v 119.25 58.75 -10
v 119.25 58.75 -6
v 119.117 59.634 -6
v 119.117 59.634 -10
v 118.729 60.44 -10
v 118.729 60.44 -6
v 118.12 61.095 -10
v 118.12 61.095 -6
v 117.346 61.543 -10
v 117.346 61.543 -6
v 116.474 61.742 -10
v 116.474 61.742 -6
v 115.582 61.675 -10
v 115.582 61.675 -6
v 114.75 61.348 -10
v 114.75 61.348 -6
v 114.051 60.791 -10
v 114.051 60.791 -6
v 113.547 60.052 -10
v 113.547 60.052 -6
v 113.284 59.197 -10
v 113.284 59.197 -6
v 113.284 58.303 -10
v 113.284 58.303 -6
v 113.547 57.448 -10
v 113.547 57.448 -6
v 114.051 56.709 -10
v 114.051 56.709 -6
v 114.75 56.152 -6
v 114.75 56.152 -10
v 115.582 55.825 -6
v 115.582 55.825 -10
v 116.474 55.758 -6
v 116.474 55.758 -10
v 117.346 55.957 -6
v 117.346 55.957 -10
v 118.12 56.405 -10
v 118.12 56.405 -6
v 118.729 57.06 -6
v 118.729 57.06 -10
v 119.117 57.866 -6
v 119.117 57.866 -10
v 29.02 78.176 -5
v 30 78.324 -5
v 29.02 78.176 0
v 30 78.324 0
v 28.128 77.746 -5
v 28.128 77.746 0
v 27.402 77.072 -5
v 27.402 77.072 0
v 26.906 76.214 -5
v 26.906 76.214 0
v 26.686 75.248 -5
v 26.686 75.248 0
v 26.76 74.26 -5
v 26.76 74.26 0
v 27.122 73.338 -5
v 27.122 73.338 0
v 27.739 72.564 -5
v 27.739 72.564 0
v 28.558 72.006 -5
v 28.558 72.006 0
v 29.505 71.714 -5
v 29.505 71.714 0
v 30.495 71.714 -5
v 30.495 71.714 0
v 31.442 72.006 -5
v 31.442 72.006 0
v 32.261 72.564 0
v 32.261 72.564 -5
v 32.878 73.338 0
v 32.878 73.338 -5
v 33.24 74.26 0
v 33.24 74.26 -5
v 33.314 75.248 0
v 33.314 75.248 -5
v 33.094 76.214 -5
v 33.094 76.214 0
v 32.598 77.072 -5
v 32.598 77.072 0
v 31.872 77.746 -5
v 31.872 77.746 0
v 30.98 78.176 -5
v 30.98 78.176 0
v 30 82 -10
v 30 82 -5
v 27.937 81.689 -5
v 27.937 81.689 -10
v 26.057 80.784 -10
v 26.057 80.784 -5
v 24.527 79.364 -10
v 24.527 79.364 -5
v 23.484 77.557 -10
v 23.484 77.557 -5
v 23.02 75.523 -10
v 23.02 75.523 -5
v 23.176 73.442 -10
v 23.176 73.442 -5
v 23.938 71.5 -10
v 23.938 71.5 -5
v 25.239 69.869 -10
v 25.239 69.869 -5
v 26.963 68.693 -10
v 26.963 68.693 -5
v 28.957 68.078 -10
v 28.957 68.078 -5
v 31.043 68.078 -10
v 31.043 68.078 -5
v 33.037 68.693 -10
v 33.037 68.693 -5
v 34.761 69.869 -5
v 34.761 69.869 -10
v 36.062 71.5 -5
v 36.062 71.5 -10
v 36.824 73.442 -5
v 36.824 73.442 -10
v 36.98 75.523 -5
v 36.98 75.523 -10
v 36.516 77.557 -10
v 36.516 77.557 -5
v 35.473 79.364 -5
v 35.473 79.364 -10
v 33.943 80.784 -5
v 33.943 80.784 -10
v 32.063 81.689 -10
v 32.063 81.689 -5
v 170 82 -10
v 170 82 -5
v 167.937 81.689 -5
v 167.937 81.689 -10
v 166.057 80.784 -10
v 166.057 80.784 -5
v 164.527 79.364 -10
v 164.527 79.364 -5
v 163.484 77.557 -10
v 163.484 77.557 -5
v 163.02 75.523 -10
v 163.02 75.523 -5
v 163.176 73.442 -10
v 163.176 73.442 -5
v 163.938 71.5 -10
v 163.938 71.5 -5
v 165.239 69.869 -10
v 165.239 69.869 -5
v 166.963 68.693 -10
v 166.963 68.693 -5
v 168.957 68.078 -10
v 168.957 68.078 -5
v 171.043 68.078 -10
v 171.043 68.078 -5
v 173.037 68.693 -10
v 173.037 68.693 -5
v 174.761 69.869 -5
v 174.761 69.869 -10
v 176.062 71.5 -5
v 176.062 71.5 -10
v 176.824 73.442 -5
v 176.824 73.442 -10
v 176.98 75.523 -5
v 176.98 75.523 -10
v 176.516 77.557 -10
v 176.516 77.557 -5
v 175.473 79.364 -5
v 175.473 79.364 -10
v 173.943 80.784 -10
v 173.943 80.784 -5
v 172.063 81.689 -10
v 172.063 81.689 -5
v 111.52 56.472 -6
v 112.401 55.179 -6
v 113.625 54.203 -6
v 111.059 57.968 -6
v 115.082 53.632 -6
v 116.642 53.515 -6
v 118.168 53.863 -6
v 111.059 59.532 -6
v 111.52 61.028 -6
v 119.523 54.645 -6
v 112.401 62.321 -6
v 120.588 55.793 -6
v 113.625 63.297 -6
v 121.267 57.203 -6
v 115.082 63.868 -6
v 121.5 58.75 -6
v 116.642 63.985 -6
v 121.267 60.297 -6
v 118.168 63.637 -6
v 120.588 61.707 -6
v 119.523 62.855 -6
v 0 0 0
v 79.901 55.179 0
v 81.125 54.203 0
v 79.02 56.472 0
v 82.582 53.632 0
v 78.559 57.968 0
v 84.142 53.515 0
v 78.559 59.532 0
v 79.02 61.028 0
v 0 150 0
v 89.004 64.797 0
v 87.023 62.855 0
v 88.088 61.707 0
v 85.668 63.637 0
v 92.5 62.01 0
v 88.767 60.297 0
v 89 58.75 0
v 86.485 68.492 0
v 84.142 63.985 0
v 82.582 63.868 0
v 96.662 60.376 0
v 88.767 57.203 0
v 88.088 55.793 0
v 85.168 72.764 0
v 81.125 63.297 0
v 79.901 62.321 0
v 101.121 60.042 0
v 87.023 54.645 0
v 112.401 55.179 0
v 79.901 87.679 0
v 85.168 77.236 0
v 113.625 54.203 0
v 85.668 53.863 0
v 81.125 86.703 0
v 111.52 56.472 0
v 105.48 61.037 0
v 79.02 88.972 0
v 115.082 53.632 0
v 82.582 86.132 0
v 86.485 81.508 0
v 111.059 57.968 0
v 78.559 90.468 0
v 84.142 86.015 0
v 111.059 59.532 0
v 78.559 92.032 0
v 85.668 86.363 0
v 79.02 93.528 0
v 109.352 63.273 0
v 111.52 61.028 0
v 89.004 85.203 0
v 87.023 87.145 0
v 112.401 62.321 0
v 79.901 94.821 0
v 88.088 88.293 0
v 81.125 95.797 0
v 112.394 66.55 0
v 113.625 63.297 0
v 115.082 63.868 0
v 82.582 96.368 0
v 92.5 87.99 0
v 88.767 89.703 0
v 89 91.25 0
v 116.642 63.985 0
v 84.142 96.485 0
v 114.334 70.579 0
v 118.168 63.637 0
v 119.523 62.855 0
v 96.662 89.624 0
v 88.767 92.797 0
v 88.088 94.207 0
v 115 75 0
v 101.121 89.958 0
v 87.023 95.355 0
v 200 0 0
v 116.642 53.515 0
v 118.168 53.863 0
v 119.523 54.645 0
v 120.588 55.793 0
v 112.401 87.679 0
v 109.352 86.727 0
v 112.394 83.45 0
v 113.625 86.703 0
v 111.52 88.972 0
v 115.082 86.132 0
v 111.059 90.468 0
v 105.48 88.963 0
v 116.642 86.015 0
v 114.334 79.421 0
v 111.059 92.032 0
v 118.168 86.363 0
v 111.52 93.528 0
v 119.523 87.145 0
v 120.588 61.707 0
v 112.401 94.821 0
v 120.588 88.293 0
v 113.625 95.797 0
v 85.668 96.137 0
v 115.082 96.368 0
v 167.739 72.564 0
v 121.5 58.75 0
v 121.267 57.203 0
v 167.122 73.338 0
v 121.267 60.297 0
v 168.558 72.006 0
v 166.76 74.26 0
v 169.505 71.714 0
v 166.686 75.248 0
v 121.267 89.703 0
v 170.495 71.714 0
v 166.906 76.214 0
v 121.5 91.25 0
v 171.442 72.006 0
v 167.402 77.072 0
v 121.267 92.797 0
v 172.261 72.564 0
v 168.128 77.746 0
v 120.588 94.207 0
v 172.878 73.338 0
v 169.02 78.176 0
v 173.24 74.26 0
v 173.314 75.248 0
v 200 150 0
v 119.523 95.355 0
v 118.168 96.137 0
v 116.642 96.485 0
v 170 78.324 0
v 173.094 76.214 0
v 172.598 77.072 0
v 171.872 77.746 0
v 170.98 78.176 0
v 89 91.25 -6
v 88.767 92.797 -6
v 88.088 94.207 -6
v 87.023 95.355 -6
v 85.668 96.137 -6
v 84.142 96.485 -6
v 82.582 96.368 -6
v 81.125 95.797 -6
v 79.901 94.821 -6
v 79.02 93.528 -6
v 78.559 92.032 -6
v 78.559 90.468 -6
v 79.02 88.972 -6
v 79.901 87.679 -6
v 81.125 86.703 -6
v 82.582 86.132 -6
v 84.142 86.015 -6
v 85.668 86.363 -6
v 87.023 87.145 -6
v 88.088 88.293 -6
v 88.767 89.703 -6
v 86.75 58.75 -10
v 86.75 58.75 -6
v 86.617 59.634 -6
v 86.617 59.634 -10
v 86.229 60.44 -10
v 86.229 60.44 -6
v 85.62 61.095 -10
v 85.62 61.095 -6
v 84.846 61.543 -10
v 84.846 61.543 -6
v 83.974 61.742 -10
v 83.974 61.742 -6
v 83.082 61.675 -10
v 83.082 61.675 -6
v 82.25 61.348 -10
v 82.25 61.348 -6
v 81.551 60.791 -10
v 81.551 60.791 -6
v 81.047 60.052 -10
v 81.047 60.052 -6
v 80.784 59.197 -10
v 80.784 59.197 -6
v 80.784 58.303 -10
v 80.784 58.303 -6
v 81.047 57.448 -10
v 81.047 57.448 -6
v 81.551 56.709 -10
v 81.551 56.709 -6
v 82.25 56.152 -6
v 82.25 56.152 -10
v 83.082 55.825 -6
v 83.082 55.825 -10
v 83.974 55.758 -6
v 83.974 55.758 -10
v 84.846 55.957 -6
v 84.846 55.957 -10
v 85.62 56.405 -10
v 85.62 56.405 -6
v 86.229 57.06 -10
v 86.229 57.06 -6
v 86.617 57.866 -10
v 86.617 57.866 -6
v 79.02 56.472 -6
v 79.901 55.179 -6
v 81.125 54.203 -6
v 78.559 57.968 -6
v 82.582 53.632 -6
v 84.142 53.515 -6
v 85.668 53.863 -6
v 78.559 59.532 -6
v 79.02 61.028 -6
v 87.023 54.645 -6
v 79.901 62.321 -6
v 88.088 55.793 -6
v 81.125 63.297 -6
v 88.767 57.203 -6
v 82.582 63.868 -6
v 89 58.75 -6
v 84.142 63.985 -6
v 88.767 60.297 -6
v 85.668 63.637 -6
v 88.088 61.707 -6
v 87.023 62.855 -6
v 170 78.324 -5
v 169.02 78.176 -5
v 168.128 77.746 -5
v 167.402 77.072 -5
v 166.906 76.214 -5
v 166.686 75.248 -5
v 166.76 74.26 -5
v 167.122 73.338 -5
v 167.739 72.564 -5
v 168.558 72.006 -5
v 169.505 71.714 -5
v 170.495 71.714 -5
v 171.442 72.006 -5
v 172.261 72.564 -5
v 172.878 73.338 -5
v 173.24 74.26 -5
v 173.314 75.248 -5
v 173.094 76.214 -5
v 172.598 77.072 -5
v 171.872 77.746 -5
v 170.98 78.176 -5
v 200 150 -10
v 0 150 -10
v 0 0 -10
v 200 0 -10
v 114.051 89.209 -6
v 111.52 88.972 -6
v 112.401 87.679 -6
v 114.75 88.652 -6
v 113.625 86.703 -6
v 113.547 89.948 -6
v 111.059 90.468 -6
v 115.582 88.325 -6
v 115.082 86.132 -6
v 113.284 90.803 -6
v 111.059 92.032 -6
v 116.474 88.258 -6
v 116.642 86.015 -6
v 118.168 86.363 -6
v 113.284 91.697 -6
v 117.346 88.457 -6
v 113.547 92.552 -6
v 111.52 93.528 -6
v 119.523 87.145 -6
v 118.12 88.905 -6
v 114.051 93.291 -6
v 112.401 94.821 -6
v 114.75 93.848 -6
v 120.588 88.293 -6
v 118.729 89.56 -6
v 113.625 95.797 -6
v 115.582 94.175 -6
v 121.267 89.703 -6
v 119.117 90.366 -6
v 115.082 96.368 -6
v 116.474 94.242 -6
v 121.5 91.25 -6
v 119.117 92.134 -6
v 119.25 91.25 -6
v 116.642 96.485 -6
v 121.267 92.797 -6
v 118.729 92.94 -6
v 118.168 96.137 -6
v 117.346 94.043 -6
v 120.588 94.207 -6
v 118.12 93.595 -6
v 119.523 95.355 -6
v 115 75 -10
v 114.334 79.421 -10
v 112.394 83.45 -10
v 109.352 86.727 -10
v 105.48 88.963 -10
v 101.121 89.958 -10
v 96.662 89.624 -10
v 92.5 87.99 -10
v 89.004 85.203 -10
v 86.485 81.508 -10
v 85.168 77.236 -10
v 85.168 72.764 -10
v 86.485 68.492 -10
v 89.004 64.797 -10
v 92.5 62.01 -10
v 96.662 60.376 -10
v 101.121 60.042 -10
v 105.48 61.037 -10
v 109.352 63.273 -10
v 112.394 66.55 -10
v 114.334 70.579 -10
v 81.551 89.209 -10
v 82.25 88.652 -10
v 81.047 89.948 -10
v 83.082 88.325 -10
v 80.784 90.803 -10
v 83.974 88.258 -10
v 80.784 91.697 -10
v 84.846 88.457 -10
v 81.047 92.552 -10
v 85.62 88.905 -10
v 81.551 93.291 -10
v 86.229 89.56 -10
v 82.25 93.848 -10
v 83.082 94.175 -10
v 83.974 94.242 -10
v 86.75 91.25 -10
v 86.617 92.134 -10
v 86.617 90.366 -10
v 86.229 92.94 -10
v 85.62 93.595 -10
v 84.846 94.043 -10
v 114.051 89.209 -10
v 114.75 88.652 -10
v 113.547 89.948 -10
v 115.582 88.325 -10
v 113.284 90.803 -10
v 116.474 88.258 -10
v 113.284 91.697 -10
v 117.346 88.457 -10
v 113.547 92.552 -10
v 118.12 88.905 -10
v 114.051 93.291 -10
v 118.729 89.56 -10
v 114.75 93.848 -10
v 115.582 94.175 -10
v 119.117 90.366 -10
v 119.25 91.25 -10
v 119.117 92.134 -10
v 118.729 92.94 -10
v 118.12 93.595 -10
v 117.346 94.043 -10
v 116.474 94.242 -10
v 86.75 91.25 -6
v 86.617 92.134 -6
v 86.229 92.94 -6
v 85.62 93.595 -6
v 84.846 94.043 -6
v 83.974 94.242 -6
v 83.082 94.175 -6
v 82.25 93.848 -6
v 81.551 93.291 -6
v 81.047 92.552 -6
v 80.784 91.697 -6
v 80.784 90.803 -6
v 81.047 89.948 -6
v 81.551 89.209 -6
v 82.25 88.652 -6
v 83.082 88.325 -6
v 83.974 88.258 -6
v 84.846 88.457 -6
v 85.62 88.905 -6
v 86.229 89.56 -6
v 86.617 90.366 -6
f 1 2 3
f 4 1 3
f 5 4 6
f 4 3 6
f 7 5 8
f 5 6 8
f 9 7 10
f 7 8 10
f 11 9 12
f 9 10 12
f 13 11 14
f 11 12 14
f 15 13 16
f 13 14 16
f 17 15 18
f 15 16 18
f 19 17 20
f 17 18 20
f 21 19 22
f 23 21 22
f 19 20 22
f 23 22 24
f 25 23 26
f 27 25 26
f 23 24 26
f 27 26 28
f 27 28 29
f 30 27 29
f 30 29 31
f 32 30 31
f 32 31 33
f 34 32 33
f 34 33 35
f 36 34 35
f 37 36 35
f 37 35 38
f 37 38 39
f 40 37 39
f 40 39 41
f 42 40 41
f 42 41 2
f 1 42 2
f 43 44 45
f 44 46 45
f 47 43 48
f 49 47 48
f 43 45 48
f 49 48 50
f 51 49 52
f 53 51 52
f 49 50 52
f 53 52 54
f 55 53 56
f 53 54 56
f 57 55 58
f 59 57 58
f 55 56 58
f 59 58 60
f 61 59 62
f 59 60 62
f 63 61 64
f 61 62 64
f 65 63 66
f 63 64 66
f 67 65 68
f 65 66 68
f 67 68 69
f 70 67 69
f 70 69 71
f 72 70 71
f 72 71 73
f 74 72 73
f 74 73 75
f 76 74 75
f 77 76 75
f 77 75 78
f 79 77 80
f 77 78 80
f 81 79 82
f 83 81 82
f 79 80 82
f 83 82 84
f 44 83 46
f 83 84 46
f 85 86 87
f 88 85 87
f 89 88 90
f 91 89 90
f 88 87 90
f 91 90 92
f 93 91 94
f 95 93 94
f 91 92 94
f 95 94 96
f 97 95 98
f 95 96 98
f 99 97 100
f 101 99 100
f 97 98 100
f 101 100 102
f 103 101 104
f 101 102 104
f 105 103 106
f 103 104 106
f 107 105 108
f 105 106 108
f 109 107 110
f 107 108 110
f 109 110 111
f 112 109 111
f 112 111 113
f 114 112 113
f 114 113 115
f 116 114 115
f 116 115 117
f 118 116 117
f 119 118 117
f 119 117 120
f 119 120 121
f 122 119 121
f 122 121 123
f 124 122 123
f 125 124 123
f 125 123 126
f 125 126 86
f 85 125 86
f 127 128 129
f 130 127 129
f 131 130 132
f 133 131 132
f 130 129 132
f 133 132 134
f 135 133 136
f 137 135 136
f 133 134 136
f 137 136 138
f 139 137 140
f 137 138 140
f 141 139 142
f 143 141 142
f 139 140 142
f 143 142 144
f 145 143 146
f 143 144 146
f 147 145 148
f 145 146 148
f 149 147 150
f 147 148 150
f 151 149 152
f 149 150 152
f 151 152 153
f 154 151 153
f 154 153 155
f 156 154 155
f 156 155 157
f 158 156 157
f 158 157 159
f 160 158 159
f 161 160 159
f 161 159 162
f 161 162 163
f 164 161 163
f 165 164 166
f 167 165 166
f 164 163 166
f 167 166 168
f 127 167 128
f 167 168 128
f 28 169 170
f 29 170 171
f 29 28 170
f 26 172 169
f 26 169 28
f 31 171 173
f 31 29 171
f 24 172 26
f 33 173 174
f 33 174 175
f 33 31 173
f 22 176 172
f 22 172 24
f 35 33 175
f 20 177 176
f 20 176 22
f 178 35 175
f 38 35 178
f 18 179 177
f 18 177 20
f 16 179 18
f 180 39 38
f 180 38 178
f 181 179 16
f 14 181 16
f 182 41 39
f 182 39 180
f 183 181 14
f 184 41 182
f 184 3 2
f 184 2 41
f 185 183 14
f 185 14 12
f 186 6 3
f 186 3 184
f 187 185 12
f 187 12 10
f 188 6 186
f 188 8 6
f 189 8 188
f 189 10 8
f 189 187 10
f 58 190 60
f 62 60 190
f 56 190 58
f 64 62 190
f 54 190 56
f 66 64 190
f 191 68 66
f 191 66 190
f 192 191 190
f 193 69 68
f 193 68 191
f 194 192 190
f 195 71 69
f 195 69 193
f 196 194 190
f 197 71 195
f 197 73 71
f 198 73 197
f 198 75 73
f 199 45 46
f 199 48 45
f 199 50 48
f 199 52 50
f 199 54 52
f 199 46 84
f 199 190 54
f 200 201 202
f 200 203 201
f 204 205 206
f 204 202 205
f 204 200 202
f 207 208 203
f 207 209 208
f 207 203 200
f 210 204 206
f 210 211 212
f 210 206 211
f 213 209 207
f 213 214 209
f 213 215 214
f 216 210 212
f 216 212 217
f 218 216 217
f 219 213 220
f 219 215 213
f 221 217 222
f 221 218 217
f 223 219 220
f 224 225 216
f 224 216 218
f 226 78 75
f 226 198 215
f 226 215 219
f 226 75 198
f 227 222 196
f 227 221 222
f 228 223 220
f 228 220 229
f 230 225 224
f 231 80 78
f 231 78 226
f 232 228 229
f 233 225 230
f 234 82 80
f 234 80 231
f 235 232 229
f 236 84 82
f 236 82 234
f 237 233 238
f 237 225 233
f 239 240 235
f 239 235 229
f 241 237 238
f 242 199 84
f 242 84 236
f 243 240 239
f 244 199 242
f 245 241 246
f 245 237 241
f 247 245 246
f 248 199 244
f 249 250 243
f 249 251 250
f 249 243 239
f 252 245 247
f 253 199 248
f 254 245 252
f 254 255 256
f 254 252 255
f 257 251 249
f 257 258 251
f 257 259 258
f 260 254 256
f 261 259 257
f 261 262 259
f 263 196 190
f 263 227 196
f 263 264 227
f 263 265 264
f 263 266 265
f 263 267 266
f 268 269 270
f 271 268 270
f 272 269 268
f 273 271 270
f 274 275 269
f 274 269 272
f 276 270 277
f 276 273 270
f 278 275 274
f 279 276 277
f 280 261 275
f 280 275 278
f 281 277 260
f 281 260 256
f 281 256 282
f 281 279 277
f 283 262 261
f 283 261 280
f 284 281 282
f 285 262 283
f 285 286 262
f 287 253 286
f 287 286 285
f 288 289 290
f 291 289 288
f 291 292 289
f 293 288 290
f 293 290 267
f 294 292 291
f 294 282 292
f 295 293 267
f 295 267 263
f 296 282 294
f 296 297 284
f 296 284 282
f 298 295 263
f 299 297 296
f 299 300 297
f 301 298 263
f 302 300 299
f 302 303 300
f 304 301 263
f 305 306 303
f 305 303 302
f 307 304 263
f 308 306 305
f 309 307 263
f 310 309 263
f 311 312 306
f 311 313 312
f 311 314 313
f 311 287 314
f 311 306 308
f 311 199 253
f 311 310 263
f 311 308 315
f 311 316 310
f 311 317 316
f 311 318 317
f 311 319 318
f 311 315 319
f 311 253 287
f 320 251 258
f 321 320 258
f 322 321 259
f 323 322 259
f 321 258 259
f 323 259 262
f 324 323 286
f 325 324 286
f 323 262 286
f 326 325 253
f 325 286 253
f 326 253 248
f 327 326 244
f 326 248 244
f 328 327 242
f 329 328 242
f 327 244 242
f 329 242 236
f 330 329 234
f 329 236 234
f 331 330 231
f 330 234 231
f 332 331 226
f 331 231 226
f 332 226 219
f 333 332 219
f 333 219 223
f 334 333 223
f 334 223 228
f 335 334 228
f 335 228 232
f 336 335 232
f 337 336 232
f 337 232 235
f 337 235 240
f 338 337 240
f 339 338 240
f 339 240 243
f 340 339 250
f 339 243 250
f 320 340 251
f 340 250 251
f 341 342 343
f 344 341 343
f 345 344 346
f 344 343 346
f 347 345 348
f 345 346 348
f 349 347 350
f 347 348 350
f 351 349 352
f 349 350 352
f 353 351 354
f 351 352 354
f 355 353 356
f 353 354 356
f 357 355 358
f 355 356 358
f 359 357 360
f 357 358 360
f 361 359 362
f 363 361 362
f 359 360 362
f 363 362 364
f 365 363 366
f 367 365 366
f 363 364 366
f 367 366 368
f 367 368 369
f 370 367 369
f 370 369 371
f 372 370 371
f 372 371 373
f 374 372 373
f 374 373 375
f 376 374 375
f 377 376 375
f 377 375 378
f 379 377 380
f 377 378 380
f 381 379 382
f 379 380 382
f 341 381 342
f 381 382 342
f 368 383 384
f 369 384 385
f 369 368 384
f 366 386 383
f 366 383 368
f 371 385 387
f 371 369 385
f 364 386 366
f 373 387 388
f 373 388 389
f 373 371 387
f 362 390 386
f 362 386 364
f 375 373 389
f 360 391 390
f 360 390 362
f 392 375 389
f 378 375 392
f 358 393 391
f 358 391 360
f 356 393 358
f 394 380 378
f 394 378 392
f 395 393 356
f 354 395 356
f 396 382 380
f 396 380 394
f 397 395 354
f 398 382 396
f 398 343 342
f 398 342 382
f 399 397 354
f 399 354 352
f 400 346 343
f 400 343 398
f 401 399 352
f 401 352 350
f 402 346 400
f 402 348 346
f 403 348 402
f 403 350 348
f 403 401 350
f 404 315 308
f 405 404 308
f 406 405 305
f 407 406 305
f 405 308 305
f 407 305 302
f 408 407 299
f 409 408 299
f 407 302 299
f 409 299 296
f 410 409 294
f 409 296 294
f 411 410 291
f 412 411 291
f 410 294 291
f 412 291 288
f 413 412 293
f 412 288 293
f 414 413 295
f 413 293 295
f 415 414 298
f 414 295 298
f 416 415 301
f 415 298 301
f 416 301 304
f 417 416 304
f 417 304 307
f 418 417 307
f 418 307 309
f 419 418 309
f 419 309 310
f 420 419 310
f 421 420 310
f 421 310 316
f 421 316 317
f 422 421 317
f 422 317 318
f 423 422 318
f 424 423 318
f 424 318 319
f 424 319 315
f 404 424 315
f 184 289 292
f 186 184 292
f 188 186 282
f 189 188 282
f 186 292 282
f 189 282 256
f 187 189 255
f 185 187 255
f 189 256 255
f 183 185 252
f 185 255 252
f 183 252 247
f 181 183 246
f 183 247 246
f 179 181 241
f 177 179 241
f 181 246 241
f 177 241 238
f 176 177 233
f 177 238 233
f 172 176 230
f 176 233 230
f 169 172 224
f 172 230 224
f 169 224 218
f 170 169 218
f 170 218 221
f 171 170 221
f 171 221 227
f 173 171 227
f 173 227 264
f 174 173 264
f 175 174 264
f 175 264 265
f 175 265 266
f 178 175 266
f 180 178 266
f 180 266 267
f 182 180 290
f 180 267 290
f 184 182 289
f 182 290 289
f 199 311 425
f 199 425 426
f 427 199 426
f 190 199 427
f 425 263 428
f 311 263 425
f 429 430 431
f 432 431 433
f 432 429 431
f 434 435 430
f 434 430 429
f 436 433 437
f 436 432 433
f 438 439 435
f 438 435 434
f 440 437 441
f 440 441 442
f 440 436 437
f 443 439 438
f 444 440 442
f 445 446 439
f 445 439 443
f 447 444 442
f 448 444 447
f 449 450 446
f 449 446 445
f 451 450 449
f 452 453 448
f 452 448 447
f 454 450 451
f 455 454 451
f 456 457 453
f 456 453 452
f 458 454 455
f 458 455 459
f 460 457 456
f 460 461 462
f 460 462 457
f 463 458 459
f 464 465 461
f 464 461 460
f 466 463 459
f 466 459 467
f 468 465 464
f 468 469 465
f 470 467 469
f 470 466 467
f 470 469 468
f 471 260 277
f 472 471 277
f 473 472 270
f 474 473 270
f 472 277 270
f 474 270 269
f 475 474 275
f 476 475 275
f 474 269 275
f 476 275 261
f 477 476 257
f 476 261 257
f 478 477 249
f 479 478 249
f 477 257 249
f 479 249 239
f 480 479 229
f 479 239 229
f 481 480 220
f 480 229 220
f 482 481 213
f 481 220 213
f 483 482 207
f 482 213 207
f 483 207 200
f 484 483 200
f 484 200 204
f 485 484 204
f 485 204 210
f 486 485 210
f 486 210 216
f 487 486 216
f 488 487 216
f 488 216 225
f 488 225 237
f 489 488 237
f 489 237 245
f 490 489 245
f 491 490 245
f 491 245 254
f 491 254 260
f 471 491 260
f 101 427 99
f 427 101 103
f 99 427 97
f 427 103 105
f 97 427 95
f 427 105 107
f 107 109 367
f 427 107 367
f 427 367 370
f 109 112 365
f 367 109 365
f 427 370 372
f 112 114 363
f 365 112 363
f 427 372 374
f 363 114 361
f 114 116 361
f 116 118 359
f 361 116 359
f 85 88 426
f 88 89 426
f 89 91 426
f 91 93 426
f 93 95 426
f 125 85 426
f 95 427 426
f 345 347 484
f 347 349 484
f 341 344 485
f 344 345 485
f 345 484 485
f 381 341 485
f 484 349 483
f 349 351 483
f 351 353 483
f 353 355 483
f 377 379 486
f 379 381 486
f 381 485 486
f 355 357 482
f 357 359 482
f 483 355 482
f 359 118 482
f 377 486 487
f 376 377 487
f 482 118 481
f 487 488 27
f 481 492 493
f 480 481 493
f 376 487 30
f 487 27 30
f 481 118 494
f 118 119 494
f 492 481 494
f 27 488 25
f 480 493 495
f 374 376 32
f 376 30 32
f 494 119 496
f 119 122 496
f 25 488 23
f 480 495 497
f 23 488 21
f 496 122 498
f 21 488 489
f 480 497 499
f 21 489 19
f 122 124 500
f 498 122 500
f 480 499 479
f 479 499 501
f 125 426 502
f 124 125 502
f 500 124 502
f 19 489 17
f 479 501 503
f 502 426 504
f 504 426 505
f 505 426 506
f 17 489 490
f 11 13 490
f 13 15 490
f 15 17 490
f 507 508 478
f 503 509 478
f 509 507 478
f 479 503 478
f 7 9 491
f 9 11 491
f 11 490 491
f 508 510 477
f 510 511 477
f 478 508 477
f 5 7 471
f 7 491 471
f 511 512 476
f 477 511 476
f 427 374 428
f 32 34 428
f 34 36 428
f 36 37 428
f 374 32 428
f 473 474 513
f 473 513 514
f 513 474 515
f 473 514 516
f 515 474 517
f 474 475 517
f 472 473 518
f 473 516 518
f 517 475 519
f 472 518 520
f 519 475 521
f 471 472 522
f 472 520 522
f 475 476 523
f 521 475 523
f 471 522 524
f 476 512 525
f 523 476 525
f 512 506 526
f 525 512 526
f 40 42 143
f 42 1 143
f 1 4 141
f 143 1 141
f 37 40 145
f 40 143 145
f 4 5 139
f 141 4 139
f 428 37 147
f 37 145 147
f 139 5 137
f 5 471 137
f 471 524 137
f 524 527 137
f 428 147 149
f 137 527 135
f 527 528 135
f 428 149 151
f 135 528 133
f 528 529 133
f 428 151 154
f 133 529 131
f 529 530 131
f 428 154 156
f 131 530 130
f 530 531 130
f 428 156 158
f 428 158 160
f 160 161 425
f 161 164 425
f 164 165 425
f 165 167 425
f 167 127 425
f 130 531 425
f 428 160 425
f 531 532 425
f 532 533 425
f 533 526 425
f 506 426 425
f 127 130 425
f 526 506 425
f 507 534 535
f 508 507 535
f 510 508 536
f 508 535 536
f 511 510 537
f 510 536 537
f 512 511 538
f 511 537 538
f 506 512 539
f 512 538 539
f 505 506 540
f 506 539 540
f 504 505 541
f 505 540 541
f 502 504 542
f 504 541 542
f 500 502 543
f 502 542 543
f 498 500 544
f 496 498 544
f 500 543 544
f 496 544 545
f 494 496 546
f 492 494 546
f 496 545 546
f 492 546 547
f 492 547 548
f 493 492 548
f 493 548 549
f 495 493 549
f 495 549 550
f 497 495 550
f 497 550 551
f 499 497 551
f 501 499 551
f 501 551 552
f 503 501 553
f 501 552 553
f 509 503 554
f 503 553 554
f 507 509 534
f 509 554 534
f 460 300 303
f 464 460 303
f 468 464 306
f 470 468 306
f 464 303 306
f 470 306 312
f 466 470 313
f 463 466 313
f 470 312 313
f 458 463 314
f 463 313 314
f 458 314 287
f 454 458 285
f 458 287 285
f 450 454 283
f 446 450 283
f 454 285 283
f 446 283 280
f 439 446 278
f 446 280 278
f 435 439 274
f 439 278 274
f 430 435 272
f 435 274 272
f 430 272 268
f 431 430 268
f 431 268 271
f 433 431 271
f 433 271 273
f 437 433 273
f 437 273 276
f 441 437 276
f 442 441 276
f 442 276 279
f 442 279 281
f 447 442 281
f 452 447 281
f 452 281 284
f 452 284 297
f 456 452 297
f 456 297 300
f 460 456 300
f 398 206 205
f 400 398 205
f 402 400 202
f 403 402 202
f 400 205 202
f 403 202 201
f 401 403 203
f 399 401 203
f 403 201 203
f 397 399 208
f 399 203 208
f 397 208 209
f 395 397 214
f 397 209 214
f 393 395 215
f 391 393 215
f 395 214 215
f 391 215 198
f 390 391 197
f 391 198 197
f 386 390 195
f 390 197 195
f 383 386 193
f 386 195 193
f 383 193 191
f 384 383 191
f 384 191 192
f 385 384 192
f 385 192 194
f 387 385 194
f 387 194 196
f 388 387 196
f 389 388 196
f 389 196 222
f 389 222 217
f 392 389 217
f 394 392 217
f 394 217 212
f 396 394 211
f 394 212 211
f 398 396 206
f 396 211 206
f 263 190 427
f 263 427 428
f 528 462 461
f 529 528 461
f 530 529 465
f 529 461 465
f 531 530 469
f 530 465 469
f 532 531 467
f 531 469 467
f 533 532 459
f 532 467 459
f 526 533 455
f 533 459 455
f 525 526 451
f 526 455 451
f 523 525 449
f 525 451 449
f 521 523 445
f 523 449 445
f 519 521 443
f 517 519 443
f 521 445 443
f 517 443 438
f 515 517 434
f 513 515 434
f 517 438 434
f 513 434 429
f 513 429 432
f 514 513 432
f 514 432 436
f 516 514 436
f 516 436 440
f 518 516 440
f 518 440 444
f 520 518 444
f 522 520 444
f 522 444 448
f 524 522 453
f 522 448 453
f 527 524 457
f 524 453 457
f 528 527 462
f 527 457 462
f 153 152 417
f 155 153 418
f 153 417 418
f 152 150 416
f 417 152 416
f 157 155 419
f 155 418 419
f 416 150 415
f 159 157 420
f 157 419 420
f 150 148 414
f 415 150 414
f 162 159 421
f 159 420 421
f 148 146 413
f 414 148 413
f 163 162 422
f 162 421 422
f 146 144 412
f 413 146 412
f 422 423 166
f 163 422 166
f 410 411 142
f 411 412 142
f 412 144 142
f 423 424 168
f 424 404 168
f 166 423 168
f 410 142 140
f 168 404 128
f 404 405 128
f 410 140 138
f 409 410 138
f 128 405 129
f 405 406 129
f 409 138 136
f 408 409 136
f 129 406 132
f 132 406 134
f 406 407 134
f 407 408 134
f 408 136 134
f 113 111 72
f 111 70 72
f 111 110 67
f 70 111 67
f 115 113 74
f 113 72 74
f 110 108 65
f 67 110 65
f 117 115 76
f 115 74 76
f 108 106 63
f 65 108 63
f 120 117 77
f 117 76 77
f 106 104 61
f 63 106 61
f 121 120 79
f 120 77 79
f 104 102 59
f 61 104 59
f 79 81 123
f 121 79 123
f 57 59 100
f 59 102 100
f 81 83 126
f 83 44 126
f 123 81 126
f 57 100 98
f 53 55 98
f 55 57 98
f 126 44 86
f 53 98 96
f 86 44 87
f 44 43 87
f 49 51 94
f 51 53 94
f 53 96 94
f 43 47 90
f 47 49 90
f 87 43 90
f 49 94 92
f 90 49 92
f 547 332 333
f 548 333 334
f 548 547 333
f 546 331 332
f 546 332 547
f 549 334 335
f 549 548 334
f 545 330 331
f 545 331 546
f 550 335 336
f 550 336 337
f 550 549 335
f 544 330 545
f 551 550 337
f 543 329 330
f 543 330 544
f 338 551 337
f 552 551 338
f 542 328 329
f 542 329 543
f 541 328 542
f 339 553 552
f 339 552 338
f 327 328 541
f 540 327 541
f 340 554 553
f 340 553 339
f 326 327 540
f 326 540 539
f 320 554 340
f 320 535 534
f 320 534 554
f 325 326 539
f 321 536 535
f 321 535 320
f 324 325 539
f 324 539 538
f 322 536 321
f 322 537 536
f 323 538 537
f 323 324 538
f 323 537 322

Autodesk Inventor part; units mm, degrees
ref_plane "YZ Plane" through (0, 0, 0) normal (1, 0, 0) x (0, 1, 0)
ref_plane "XZ Plane" through (0, 0, 0) normal (0, 1, 0) x (-1, 0, 0)
ref_plane "XY Plane" through (0, 0, 0) normal (0, 0, 1) x (1, 0, 0)
sketch "Sketch2" plane through (0, 0, 0) normal (0, 0, 1) x (1, 0, 0)
  line L0 (0, 0) -> (200, 0)
  line L1 (200, 0) -> (200, 150)
  line L2 (200, 150) -> (0, 150)
  line L3 (0, 150) -> (0, 0)
  circle A0 centre (100, 75) radius 15
  dimension "d4" = 150
  dimension "d5" = 200
  dimension "d6" = 75
  dimension "d7" = 100
  dimension "d8" = 30
extrude "Extrusion2" add sketch "Sketch2" against normal blind 10
sketch "Sketch6" plane through (0, 0, -10) normal (0, 0, -1) x (-1, 0, 0)
  line L0 (0, 150) -> (-200, 150) projected
  line L1 (0, 0) -> (0, 150) projected
  point P0 (-30, 75)
  point P1 (-170, 75)
  dimension "d28" = 75
  dimension "d29" = 75
  dimension "d30" = 140
  dimension "d31" = 30
hole "Hole2" at (30, 75, -10) at (170, 75, -10) direction (0, 0, 1) diameter 6.647 end through all counterbore diameter 14 counterbore depth 5 thread size "M8x1.25" class "6H" standard "ISO Metric profile"
sketch "Sketch7" plane through (0, 0, 0) normal (0, 0, 1) x (1, 0, 0)
  circle A0 centre (83.75, 91.25) radius 3
  circle A1 centre (116.25, 91.25) radius 3
  circle A2 centre (83.75, 58.75) radius 3
  circle A3 centre (116.25, 58.75) radius 3
  circle A4 centre (100, 75) radius 15 projected
  point P0 (0, 0)
  dimension "d39" = 16.25
  dimension "d40" = 16.25
  dimension "d41" = 16.25
  dimension "d42" = 16.25
  dimension "d43" = 16.25
  dimension "d44" = 16.25
  dimension "d45" = 16.25
  dimension "d46" = 16.25
  dimension "d47" = 6
extrude "Extrusion5" cut sketch "Sketch7" against normal blind 15 contours A0 | A1 | A2 | A3
sketch "Sketch8" plane through (0, 0, 0) normal (0, 0, 1) x (1, 0, 0)
  circle A0 centre (83.75, 91.25) radius 3 projected
  circle A1 centre (116.25, 91.25) radius 3 projected
  circle A2 centre (83.75, 58.75) radius 3 projected
  circle A3 centre (116.25, 58.75) radius 3 projected
  circle A4 centre (83.75, 91.25) radius 5.25
  circle A5 centre (116.25, 91.25) radius 5.25
  circle A6 centre (83.75, 58.75) radius 5.25
  circle A7 centre (116.25, 58.75) radius 5.25
  point P0 (0, 0)
  dimension "d50" = 10.5
  dimension "d51" = 10.5
  dimension "d52" = 10.5
  dimension "d53" = 10.5
extrude "Extrusion6" cut sketch "Sketch8" against normal blind 6 contours A0 | A2 | A3 | A4 | A5 | A6 | A7
equation "\"d29\" = d28"
equation "\"d40\" = d39"
equation "\"d41\" = d39"
equation "\"d42\" = d39"
equation "\"d43\" = d39"
equation "\"d44\" = d39"
equation "\"d45\" = d39"
equation "\"d46\" = d39"
equation "\"d50\" = d52"
equation "\"d51\" = d52"
equation "\"d53\" = d52"
properties part number "Soporte Piston"
